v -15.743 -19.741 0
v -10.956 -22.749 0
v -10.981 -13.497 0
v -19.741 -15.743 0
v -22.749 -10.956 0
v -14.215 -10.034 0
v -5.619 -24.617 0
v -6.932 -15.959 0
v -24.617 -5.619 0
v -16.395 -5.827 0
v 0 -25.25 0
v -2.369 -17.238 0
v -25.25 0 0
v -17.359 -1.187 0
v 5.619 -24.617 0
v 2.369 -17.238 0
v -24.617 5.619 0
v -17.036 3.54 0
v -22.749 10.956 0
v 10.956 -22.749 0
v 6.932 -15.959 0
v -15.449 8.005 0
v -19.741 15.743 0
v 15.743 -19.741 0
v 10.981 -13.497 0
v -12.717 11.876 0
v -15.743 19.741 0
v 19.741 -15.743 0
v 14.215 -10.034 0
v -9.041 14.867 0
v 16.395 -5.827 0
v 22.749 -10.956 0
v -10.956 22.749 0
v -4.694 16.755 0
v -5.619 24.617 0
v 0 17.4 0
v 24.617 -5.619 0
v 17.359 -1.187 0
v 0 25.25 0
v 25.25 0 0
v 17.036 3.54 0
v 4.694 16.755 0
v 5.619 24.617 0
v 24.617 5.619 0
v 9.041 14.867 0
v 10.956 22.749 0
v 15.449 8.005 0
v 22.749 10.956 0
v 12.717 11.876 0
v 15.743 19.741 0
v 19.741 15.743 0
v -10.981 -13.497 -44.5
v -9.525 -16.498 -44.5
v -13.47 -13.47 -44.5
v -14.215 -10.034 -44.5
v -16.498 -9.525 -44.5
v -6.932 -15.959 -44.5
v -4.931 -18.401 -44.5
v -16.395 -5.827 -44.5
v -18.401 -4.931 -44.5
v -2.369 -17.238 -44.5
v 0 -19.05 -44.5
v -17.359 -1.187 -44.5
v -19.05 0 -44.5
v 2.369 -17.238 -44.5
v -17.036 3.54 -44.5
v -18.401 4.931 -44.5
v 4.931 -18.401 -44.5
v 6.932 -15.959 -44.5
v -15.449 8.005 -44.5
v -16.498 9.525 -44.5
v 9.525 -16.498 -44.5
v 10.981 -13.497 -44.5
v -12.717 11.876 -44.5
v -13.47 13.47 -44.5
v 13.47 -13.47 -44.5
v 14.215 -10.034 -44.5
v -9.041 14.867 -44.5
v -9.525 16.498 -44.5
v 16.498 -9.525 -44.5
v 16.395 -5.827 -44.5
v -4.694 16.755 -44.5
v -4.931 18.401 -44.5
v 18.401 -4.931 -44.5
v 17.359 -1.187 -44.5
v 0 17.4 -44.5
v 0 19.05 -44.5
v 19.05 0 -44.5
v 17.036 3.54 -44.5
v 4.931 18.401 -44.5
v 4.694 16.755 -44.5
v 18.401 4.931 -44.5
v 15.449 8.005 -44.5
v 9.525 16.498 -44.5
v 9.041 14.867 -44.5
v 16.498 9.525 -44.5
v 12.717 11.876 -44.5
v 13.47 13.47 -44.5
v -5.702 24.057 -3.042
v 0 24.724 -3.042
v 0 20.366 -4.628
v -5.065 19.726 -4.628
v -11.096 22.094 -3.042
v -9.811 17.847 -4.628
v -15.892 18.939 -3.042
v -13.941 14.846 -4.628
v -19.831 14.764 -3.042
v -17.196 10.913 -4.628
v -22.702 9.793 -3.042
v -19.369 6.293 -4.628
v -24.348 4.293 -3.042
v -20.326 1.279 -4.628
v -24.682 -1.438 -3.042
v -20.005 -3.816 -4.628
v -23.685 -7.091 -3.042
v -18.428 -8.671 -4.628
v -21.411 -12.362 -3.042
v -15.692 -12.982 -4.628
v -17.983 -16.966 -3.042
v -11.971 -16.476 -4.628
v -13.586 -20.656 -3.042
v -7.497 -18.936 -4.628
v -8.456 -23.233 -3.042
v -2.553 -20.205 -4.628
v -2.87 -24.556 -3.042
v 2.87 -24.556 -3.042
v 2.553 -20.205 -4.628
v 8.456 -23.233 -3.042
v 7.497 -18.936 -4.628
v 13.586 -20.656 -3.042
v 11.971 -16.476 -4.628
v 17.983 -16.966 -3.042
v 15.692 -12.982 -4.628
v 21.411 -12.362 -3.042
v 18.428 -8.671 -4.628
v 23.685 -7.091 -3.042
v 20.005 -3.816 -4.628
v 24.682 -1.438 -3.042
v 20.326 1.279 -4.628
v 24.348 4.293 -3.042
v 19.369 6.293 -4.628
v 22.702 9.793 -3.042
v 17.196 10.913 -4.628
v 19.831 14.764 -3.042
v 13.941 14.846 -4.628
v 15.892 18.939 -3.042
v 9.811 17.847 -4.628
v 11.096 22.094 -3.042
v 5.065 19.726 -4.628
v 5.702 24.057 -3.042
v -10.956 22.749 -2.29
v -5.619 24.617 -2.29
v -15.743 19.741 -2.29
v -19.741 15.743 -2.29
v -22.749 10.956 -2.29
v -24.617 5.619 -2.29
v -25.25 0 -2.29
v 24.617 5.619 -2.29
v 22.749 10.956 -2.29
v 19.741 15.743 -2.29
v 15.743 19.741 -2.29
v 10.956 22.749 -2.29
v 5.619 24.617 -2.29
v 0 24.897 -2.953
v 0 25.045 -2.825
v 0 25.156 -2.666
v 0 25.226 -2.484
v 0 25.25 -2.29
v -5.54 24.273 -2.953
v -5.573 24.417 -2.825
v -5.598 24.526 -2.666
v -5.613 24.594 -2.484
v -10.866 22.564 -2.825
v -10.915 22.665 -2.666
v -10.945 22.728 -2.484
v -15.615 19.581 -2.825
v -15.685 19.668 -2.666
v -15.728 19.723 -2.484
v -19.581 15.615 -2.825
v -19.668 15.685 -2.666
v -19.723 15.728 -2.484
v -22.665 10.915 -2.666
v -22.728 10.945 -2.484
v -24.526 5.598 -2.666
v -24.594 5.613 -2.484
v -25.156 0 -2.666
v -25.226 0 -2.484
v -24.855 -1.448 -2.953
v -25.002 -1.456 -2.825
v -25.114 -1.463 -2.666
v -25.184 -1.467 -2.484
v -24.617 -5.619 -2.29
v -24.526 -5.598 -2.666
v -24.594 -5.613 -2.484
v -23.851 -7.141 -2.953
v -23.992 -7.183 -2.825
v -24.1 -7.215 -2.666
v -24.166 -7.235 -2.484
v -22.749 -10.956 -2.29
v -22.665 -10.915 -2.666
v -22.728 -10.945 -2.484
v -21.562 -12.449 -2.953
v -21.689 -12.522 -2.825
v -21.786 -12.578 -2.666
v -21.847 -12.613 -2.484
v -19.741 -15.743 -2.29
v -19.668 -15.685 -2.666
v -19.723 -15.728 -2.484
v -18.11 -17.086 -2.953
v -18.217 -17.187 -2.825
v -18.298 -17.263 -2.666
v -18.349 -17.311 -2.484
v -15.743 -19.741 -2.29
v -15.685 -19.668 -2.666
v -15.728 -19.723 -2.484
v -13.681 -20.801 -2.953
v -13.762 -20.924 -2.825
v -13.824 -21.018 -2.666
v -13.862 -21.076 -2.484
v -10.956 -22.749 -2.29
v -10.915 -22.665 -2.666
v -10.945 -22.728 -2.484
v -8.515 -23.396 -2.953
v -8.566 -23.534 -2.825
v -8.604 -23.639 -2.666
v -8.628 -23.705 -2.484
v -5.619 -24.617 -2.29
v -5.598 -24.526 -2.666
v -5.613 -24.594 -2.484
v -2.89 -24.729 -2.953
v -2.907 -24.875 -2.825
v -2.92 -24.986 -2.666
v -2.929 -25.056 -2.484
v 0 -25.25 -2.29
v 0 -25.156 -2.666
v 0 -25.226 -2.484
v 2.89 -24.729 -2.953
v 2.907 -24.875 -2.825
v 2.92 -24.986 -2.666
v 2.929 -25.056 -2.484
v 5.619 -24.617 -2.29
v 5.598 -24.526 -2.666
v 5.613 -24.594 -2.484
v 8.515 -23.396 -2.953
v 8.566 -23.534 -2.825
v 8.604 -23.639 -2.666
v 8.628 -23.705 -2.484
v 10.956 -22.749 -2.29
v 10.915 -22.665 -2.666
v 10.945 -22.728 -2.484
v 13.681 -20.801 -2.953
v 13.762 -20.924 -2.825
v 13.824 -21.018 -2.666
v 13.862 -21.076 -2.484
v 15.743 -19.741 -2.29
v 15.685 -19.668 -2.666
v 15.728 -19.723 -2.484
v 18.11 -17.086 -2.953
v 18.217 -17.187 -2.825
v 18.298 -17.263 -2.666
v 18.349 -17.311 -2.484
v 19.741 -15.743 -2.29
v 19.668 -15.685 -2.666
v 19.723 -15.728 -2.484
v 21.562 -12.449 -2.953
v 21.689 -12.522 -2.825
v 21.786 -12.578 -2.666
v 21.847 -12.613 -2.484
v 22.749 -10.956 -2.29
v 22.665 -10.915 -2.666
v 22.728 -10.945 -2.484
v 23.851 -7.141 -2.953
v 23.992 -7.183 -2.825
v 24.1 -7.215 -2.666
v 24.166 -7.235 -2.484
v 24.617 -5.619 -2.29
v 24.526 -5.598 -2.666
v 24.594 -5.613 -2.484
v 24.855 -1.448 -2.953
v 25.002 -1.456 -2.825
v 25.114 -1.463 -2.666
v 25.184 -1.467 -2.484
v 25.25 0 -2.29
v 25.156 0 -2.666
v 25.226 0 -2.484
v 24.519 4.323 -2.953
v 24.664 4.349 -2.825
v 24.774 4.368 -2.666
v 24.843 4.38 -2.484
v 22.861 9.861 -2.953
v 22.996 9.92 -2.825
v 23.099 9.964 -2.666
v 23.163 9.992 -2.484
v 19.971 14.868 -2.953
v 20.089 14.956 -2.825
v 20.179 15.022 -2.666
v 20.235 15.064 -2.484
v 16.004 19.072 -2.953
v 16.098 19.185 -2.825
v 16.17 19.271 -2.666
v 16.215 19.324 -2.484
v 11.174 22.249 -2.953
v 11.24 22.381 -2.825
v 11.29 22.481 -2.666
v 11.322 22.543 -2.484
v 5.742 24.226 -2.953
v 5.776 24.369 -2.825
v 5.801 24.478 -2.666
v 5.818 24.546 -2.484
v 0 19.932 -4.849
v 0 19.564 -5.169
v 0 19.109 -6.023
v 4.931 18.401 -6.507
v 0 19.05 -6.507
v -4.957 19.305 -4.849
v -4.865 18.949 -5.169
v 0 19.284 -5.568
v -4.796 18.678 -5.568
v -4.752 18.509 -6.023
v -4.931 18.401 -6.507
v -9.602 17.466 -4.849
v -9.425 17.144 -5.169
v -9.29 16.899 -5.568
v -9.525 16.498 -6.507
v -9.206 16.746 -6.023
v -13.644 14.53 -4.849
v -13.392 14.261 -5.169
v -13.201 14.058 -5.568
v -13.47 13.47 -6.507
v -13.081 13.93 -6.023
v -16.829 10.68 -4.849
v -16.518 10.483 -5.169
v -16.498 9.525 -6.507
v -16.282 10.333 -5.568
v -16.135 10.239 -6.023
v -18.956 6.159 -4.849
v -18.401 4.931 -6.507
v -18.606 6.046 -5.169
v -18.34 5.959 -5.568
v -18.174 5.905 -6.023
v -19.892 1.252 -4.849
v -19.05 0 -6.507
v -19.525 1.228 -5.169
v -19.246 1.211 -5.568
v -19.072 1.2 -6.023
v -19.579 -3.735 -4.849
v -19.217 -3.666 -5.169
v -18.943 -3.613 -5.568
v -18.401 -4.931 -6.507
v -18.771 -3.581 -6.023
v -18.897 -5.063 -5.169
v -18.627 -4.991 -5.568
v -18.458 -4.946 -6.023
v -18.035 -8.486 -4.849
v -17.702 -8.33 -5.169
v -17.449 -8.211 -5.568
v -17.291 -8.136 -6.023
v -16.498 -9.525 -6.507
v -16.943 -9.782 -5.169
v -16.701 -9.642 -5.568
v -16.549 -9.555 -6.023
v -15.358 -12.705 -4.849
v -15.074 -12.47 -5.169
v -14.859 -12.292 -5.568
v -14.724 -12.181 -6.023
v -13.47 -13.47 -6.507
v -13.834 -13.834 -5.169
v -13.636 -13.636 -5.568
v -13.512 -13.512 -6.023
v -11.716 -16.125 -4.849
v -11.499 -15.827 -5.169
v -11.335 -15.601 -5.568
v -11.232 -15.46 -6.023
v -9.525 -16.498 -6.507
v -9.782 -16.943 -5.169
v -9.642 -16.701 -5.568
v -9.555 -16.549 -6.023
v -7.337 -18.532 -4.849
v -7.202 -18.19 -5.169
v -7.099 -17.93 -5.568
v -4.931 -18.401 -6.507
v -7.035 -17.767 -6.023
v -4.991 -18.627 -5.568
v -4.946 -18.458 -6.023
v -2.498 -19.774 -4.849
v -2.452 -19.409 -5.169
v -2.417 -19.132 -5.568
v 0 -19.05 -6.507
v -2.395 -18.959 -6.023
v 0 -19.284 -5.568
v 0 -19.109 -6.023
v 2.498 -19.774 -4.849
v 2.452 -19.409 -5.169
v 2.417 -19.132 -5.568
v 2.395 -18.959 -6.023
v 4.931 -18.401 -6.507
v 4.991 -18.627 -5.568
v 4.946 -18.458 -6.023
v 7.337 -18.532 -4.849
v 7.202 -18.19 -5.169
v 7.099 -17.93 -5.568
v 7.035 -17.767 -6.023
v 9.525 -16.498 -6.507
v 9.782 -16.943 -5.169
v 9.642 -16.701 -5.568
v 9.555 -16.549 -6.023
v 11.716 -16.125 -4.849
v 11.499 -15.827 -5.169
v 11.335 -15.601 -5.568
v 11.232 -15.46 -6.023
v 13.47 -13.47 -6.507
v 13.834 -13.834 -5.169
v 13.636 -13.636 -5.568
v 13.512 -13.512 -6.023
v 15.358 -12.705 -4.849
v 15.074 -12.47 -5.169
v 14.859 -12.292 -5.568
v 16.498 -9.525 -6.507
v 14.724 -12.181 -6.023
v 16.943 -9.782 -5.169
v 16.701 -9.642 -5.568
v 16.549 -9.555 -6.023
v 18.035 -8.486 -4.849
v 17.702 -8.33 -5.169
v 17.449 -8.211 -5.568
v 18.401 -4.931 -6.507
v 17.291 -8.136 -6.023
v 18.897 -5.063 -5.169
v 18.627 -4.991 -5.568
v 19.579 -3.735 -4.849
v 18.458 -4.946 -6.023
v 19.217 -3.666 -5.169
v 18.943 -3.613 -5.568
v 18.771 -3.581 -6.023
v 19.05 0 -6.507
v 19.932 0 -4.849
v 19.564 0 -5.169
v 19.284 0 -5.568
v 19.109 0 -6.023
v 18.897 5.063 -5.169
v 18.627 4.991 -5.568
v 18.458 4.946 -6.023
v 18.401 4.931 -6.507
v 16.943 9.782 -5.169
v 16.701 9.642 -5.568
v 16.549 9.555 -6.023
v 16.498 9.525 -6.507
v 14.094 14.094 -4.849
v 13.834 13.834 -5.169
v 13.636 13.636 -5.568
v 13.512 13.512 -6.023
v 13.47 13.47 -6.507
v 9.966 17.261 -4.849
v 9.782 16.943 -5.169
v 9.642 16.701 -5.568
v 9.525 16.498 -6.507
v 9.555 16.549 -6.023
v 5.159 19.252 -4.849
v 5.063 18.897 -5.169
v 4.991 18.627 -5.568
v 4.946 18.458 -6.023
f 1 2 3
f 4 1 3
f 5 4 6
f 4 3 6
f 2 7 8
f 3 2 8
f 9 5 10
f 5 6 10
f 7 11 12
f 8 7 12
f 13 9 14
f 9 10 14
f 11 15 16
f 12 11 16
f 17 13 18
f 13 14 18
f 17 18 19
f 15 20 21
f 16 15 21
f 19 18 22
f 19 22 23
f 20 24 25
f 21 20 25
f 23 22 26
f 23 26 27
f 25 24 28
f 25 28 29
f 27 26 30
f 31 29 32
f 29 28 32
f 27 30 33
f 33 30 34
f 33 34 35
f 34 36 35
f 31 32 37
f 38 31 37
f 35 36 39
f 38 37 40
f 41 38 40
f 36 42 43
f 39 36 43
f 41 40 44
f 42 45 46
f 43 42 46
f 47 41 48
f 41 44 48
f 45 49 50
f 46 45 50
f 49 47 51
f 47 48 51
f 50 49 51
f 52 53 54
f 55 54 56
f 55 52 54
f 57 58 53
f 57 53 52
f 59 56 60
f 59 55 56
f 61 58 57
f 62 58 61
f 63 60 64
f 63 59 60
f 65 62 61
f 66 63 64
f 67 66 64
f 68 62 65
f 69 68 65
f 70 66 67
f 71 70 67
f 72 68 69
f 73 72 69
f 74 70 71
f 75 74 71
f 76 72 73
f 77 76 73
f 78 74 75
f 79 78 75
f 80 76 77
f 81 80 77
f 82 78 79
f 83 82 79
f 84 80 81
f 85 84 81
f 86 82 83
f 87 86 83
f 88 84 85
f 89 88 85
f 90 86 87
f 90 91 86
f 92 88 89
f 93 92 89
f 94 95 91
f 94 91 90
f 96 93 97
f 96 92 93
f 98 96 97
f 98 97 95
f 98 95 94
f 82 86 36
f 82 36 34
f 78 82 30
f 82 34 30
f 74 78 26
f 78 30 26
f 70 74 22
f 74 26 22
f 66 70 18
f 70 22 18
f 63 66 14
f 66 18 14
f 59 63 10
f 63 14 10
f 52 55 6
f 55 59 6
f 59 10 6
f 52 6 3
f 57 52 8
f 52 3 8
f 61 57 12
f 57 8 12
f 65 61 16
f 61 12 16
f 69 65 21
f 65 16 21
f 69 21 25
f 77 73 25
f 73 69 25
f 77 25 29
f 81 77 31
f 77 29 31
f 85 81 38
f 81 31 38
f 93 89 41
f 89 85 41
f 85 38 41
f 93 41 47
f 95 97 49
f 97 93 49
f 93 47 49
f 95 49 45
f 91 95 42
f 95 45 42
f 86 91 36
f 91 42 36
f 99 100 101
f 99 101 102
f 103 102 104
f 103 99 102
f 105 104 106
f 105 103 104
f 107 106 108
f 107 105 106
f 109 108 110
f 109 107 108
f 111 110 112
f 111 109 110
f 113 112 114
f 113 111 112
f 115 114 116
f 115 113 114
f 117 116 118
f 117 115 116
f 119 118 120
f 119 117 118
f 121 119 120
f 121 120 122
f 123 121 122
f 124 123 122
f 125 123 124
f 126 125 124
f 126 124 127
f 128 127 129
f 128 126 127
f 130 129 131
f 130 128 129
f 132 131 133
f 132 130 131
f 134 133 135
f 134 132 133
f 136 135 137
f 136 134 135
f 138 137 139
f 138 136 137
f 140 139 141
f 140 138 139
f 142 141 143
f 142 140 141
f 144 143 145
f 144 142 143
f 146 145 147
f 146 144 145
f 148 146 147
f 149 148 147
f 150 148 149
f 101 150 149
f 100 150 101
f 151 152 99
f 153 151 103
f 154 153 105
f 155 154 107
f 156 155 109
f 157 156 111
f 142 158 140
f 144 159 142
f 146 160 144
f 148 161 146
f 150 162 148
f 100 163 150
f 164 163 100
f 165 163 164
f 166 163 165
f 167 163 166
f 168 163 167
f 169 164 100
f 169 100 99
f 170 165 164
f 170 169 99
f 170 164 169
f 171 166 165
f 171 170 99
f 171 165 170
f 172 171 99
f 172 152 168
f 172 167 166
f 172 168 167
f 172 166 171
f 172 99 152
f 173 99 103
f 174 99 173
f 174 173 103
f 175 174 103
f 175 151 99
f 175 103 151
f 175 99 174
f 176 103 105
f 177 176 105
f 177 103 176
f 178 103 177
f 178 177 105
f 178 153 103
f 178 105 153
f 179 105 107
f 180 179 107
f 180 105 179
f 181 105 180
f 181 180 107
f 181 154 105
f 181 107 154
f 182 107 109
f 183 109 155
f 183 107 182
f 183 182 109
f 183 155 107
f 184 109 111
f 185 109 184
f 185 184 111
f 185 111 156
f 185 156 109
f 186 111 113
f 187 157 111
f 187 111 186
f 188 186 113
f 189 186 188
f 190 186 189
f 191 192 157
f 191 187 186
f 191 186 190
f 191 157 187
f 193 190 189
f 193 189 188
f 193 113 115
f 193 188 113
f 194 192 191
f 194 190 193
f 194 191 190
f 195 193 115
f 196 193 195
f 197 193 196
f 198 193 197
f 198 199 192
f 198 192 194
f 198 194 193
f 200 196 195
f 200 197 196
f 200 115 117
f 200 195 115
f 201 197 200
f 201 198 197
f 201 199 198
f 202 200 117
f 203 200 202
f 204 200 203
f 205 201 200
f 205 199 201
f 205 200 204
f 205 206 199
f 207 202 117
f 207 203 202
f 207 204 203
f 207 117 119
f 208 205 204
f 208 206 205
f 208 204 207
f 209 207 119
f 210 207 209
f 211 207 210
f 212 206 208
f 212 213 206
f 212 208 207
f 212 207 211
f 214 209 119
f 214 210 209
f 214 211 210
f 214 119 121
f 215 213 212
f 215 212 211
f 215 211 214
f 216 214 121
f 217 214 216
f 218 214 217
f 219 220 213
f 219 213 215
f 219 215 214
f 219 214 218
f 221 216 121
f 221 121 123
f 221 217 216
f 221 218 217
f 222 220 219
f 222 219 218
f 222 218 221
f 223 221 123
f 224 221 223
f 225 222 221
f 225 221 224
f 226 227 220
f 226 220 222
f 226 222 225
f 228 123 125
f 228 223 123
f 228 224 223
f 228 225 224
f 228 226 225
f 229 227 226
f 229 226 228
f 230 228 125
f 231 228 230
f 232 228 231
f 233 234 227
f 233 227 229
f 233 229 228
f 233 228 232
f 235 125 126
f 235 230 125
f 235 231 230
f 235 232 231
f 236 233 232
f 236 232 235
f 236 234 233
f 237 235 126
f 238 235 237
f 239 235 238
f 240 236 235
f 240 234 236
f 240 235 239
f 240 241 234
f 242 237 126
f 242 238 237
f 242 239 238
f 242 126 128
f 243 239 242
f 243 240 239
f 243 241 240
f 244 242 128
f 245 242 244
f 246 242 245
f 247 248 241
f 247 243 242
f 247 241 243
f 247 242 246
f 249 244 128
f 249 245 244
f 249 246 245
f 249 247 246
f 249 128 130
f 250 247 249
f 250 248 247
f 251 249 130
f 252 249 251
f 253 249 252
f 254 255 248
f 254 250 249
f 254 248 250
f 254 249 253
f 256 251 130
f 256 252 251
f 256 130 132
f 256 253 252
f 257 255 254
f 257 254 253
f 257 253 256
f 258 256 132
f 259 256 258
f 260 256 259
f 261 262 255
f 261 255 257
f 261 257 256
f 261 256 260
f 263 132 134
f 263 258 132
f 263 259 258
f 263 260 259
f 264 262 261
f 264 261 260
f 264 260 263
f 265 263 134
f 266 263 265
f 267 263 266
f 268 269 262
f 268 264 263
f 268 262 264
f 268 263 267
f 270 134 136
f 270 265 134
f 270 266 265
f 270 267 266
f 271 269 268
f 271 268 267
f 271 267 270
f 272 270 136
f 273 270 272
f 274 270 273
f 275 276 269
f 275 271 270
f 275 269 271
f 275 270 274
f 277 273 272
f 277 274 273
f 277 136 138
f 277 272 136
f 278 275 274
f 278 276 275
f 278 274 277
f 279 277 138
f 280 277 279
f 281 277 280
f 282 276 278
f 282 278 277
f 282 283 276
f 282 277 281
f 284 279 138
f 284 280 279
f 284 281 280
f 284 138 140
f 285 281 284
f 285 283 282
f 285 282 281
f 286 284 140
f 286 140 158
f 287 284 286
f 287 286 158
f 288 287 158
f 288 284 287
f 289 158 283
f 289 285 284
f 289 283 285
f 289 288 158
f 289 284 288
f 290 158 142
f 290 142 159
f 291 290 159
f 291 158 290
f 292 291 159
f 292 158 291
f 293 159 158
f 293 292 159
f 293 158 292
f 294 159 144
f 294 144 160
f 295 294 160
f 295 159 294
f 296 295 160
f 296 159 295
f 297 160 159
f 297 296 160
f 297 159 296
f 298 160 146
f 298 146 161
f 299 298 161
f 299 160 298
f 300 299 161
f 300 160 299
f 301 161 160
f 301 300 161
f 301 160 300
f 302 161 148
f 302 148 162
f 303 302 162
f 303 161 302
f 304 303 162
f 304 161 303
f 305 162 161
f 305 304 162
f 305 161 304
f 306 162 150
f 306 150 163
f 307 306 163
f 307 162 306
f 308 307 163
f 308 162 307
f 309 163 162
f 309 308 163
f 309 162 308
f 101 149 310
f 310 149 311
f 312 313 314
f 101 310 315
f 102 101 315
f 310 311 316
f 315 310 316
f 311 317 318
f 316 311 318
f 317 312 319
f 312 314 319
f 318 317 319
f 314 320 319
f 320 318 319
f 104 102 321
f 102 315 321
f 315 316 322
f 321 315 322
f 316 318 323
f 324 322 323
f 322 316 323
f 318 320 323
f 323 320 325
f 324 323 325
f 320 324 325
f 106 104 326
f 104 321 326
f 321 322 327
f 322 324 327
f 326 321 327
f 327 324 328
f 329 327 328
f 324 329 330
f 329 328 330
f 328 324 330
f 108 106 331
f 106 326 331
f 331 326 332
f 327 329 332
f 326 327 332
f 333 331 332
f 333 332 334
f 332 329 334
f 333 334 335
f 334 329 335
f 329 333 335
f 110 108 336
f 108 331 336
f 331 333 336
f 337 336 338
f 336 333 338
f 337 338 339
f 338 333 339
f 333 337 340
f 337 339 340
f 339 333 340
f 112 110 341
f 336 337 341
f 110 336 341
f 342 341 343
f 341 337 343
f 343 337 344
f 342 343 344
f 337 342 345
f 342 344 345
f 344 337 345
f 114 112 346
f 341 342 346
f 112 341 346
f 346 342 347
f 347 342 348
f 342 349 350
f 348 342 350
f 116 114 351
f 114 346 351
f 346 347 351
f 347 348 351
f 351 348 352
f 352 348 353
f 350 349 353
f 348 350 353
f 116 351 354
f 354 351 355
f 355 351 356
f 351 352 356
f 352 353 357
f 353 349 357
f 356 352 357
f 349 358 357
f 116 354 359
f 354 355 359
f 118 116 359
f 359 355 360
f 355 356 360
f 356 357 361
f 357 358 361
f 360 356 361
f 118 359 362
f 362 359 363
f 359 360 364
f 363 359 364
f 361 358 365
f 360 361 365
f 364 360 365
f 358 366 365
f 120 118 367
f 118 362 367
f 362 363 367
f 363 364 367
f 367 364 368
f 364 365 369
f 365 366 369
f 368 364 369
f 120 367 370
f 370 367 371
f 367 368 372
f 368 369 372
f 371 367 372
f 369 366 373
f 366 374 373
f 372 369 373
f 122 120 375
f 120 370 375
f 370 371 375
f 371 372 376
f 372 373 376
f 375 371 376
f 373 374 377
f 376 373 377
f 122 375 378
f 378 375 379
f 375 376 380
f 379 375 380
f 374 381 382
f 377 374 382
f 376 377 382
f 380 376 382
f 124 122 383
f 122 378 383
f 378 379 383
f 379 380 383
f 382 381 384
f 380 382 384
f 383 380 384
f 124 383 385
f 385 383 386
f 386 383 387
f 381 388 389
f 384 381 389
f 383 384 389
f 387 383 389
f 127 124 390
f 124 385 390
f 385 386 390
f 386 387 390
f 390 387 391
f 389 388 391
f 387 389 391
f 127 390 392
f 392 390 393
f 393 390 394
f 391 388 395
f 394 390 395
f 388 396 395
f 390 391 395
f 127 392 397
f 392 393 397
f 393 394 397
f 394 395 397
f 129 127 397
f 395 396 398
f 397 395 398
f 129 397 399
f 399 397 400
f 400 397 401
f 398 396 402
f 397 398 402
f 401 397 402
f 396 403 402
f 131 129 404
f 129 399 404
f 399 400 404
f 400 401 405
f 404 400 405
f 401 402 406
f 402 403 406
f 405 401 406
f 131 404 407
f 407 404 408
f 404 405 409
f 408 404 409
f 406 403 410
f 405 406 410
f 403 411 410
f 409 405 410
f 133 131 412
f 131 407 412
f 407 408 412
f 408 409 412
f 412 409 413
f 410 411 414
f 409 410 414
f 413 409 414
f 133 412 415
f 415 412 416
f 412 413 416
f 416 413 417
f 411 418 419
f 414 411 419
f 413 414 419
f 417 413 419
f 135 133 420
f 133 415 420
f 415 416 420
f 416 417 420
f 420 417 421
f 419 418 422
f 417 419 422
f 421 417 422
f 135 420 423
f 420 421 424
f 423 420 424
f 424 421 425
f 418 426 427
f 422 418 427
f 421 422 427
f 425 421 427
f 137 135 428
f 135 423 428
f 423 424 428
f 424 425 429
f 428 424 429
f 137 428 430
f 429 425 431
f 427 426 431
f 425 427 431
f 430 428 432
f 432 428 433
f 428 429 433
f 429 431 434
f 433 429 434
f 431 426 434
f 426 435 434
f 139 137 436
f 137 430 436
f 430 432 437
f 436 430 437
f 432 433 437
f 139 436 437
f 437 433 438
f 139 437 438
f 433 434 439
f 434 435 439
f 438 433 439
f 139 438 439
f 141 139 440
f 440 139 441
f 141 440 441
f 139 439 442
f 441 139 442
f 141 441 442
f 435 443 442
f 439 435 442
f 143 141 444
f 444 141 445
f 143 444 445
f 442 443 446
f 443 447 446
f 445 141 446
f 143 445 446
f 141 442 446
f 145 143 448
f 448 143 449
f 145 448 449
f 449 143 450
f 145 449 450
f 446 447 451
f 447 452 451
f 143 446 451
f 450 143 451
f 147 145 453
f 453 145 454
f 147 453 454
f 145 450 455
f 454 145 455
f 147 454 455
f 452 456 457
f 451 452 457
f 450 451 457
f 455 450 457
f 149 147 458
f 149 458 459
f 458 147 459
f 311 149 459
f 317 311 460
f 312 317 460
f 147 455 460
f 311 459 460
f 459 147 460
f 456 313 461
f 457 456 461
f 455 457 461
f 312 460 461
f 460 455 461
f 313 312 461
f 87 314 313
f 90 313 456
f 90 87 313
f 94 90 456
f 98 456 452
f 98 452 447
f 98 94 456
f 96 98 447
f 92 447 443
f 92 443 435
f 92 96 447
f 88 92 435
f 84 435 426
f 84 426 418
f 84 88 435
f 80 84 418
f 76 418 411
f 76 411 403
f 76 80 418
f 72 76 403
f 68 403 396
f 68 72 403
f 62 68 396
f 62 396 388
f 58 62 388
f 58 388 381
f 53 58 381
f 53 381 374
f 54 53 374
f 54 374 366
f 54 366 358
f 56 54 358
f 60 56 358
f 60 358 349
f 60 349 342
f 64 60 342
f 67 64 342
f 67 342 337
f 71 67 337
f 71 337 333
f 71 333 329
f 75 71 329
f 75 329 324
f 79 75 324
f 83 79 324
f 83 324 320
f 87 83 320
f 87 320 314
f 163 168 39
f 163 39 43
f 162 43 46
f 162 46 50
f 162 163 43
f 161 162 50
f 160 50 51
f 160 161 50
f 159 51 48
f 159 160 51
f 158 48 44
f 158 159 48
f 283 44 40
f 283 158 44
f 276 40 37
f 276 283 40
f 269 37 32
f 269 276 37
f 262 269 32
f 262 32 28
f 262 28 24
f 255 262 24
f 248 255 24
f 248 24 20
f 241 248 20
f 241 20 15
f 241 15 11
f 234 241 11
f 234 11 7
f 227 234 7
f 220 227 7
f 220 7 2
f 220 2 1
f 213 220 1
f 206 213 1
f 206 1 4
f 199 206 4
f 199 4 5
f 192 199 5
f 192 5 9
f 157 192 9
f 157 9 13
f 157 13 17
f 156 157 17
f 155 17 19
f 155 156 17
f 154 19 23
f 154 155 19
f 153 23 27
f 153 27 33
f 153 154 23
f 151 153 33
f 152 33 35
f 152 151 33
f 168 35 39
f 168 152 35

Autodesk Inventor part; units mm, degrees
ref_plane "YZ Plane" through (0, 0, 0) normal (1, 0, 0) x (0, 1, 0)
ref_plane "XZ Plane" through (0, 0, 0) normal (0, 1, 0) x (-1, 0, 0)
ref_plane "XY Plane" through (0, 0, 0) normal (0, 0, 1) x (1, 0, 0)
sketch "Sketch2" plane through (0, 0, 0) normal (1, 0, 0) x (0, 1, 0)
  line L0 (0, 0) -> (0, -44.5)
  line L1 (17.4, -44.5) -> (17.4, 0)
  line L2 (17.4, 0) -> (25.25, 0)
  line L3 (25.25, 0) -> (25.25, -2.29)
  line L4 (24.7236, -3.0418) -> (20.366, -4.6278)
  line L5 (19.05, -6.5072) -> (19.05, -44.5)
  line L6 (19.05, -44.5) -> (17.4, -44.5)
  arc A0 (24.7236, -3.0418) -> (25.25, -2.29) centre (24.45, -2.29) ccw
  arc A1 (20.366, -4.6278) -> (19.05, -6.5072) centre (21.05, -6.5072) ccw
  dimension "OD" = 38.1
  dimension "THW" = 1.65
  dimension "L" = 44.5
  dimension "d3" = 50.5
  dimension "d4" = 0.8
  dimension "d5" = 2.29
  dimension "d6" = 2
  dimension "d7" = 20
revolve "Revolution1" add sketch "Sketch2" angle 360 about axis through (0, 0, 0) along (0, 0, -1)
properties part number "Ferrule-38.1" material "Stainless Steel, 316L"
